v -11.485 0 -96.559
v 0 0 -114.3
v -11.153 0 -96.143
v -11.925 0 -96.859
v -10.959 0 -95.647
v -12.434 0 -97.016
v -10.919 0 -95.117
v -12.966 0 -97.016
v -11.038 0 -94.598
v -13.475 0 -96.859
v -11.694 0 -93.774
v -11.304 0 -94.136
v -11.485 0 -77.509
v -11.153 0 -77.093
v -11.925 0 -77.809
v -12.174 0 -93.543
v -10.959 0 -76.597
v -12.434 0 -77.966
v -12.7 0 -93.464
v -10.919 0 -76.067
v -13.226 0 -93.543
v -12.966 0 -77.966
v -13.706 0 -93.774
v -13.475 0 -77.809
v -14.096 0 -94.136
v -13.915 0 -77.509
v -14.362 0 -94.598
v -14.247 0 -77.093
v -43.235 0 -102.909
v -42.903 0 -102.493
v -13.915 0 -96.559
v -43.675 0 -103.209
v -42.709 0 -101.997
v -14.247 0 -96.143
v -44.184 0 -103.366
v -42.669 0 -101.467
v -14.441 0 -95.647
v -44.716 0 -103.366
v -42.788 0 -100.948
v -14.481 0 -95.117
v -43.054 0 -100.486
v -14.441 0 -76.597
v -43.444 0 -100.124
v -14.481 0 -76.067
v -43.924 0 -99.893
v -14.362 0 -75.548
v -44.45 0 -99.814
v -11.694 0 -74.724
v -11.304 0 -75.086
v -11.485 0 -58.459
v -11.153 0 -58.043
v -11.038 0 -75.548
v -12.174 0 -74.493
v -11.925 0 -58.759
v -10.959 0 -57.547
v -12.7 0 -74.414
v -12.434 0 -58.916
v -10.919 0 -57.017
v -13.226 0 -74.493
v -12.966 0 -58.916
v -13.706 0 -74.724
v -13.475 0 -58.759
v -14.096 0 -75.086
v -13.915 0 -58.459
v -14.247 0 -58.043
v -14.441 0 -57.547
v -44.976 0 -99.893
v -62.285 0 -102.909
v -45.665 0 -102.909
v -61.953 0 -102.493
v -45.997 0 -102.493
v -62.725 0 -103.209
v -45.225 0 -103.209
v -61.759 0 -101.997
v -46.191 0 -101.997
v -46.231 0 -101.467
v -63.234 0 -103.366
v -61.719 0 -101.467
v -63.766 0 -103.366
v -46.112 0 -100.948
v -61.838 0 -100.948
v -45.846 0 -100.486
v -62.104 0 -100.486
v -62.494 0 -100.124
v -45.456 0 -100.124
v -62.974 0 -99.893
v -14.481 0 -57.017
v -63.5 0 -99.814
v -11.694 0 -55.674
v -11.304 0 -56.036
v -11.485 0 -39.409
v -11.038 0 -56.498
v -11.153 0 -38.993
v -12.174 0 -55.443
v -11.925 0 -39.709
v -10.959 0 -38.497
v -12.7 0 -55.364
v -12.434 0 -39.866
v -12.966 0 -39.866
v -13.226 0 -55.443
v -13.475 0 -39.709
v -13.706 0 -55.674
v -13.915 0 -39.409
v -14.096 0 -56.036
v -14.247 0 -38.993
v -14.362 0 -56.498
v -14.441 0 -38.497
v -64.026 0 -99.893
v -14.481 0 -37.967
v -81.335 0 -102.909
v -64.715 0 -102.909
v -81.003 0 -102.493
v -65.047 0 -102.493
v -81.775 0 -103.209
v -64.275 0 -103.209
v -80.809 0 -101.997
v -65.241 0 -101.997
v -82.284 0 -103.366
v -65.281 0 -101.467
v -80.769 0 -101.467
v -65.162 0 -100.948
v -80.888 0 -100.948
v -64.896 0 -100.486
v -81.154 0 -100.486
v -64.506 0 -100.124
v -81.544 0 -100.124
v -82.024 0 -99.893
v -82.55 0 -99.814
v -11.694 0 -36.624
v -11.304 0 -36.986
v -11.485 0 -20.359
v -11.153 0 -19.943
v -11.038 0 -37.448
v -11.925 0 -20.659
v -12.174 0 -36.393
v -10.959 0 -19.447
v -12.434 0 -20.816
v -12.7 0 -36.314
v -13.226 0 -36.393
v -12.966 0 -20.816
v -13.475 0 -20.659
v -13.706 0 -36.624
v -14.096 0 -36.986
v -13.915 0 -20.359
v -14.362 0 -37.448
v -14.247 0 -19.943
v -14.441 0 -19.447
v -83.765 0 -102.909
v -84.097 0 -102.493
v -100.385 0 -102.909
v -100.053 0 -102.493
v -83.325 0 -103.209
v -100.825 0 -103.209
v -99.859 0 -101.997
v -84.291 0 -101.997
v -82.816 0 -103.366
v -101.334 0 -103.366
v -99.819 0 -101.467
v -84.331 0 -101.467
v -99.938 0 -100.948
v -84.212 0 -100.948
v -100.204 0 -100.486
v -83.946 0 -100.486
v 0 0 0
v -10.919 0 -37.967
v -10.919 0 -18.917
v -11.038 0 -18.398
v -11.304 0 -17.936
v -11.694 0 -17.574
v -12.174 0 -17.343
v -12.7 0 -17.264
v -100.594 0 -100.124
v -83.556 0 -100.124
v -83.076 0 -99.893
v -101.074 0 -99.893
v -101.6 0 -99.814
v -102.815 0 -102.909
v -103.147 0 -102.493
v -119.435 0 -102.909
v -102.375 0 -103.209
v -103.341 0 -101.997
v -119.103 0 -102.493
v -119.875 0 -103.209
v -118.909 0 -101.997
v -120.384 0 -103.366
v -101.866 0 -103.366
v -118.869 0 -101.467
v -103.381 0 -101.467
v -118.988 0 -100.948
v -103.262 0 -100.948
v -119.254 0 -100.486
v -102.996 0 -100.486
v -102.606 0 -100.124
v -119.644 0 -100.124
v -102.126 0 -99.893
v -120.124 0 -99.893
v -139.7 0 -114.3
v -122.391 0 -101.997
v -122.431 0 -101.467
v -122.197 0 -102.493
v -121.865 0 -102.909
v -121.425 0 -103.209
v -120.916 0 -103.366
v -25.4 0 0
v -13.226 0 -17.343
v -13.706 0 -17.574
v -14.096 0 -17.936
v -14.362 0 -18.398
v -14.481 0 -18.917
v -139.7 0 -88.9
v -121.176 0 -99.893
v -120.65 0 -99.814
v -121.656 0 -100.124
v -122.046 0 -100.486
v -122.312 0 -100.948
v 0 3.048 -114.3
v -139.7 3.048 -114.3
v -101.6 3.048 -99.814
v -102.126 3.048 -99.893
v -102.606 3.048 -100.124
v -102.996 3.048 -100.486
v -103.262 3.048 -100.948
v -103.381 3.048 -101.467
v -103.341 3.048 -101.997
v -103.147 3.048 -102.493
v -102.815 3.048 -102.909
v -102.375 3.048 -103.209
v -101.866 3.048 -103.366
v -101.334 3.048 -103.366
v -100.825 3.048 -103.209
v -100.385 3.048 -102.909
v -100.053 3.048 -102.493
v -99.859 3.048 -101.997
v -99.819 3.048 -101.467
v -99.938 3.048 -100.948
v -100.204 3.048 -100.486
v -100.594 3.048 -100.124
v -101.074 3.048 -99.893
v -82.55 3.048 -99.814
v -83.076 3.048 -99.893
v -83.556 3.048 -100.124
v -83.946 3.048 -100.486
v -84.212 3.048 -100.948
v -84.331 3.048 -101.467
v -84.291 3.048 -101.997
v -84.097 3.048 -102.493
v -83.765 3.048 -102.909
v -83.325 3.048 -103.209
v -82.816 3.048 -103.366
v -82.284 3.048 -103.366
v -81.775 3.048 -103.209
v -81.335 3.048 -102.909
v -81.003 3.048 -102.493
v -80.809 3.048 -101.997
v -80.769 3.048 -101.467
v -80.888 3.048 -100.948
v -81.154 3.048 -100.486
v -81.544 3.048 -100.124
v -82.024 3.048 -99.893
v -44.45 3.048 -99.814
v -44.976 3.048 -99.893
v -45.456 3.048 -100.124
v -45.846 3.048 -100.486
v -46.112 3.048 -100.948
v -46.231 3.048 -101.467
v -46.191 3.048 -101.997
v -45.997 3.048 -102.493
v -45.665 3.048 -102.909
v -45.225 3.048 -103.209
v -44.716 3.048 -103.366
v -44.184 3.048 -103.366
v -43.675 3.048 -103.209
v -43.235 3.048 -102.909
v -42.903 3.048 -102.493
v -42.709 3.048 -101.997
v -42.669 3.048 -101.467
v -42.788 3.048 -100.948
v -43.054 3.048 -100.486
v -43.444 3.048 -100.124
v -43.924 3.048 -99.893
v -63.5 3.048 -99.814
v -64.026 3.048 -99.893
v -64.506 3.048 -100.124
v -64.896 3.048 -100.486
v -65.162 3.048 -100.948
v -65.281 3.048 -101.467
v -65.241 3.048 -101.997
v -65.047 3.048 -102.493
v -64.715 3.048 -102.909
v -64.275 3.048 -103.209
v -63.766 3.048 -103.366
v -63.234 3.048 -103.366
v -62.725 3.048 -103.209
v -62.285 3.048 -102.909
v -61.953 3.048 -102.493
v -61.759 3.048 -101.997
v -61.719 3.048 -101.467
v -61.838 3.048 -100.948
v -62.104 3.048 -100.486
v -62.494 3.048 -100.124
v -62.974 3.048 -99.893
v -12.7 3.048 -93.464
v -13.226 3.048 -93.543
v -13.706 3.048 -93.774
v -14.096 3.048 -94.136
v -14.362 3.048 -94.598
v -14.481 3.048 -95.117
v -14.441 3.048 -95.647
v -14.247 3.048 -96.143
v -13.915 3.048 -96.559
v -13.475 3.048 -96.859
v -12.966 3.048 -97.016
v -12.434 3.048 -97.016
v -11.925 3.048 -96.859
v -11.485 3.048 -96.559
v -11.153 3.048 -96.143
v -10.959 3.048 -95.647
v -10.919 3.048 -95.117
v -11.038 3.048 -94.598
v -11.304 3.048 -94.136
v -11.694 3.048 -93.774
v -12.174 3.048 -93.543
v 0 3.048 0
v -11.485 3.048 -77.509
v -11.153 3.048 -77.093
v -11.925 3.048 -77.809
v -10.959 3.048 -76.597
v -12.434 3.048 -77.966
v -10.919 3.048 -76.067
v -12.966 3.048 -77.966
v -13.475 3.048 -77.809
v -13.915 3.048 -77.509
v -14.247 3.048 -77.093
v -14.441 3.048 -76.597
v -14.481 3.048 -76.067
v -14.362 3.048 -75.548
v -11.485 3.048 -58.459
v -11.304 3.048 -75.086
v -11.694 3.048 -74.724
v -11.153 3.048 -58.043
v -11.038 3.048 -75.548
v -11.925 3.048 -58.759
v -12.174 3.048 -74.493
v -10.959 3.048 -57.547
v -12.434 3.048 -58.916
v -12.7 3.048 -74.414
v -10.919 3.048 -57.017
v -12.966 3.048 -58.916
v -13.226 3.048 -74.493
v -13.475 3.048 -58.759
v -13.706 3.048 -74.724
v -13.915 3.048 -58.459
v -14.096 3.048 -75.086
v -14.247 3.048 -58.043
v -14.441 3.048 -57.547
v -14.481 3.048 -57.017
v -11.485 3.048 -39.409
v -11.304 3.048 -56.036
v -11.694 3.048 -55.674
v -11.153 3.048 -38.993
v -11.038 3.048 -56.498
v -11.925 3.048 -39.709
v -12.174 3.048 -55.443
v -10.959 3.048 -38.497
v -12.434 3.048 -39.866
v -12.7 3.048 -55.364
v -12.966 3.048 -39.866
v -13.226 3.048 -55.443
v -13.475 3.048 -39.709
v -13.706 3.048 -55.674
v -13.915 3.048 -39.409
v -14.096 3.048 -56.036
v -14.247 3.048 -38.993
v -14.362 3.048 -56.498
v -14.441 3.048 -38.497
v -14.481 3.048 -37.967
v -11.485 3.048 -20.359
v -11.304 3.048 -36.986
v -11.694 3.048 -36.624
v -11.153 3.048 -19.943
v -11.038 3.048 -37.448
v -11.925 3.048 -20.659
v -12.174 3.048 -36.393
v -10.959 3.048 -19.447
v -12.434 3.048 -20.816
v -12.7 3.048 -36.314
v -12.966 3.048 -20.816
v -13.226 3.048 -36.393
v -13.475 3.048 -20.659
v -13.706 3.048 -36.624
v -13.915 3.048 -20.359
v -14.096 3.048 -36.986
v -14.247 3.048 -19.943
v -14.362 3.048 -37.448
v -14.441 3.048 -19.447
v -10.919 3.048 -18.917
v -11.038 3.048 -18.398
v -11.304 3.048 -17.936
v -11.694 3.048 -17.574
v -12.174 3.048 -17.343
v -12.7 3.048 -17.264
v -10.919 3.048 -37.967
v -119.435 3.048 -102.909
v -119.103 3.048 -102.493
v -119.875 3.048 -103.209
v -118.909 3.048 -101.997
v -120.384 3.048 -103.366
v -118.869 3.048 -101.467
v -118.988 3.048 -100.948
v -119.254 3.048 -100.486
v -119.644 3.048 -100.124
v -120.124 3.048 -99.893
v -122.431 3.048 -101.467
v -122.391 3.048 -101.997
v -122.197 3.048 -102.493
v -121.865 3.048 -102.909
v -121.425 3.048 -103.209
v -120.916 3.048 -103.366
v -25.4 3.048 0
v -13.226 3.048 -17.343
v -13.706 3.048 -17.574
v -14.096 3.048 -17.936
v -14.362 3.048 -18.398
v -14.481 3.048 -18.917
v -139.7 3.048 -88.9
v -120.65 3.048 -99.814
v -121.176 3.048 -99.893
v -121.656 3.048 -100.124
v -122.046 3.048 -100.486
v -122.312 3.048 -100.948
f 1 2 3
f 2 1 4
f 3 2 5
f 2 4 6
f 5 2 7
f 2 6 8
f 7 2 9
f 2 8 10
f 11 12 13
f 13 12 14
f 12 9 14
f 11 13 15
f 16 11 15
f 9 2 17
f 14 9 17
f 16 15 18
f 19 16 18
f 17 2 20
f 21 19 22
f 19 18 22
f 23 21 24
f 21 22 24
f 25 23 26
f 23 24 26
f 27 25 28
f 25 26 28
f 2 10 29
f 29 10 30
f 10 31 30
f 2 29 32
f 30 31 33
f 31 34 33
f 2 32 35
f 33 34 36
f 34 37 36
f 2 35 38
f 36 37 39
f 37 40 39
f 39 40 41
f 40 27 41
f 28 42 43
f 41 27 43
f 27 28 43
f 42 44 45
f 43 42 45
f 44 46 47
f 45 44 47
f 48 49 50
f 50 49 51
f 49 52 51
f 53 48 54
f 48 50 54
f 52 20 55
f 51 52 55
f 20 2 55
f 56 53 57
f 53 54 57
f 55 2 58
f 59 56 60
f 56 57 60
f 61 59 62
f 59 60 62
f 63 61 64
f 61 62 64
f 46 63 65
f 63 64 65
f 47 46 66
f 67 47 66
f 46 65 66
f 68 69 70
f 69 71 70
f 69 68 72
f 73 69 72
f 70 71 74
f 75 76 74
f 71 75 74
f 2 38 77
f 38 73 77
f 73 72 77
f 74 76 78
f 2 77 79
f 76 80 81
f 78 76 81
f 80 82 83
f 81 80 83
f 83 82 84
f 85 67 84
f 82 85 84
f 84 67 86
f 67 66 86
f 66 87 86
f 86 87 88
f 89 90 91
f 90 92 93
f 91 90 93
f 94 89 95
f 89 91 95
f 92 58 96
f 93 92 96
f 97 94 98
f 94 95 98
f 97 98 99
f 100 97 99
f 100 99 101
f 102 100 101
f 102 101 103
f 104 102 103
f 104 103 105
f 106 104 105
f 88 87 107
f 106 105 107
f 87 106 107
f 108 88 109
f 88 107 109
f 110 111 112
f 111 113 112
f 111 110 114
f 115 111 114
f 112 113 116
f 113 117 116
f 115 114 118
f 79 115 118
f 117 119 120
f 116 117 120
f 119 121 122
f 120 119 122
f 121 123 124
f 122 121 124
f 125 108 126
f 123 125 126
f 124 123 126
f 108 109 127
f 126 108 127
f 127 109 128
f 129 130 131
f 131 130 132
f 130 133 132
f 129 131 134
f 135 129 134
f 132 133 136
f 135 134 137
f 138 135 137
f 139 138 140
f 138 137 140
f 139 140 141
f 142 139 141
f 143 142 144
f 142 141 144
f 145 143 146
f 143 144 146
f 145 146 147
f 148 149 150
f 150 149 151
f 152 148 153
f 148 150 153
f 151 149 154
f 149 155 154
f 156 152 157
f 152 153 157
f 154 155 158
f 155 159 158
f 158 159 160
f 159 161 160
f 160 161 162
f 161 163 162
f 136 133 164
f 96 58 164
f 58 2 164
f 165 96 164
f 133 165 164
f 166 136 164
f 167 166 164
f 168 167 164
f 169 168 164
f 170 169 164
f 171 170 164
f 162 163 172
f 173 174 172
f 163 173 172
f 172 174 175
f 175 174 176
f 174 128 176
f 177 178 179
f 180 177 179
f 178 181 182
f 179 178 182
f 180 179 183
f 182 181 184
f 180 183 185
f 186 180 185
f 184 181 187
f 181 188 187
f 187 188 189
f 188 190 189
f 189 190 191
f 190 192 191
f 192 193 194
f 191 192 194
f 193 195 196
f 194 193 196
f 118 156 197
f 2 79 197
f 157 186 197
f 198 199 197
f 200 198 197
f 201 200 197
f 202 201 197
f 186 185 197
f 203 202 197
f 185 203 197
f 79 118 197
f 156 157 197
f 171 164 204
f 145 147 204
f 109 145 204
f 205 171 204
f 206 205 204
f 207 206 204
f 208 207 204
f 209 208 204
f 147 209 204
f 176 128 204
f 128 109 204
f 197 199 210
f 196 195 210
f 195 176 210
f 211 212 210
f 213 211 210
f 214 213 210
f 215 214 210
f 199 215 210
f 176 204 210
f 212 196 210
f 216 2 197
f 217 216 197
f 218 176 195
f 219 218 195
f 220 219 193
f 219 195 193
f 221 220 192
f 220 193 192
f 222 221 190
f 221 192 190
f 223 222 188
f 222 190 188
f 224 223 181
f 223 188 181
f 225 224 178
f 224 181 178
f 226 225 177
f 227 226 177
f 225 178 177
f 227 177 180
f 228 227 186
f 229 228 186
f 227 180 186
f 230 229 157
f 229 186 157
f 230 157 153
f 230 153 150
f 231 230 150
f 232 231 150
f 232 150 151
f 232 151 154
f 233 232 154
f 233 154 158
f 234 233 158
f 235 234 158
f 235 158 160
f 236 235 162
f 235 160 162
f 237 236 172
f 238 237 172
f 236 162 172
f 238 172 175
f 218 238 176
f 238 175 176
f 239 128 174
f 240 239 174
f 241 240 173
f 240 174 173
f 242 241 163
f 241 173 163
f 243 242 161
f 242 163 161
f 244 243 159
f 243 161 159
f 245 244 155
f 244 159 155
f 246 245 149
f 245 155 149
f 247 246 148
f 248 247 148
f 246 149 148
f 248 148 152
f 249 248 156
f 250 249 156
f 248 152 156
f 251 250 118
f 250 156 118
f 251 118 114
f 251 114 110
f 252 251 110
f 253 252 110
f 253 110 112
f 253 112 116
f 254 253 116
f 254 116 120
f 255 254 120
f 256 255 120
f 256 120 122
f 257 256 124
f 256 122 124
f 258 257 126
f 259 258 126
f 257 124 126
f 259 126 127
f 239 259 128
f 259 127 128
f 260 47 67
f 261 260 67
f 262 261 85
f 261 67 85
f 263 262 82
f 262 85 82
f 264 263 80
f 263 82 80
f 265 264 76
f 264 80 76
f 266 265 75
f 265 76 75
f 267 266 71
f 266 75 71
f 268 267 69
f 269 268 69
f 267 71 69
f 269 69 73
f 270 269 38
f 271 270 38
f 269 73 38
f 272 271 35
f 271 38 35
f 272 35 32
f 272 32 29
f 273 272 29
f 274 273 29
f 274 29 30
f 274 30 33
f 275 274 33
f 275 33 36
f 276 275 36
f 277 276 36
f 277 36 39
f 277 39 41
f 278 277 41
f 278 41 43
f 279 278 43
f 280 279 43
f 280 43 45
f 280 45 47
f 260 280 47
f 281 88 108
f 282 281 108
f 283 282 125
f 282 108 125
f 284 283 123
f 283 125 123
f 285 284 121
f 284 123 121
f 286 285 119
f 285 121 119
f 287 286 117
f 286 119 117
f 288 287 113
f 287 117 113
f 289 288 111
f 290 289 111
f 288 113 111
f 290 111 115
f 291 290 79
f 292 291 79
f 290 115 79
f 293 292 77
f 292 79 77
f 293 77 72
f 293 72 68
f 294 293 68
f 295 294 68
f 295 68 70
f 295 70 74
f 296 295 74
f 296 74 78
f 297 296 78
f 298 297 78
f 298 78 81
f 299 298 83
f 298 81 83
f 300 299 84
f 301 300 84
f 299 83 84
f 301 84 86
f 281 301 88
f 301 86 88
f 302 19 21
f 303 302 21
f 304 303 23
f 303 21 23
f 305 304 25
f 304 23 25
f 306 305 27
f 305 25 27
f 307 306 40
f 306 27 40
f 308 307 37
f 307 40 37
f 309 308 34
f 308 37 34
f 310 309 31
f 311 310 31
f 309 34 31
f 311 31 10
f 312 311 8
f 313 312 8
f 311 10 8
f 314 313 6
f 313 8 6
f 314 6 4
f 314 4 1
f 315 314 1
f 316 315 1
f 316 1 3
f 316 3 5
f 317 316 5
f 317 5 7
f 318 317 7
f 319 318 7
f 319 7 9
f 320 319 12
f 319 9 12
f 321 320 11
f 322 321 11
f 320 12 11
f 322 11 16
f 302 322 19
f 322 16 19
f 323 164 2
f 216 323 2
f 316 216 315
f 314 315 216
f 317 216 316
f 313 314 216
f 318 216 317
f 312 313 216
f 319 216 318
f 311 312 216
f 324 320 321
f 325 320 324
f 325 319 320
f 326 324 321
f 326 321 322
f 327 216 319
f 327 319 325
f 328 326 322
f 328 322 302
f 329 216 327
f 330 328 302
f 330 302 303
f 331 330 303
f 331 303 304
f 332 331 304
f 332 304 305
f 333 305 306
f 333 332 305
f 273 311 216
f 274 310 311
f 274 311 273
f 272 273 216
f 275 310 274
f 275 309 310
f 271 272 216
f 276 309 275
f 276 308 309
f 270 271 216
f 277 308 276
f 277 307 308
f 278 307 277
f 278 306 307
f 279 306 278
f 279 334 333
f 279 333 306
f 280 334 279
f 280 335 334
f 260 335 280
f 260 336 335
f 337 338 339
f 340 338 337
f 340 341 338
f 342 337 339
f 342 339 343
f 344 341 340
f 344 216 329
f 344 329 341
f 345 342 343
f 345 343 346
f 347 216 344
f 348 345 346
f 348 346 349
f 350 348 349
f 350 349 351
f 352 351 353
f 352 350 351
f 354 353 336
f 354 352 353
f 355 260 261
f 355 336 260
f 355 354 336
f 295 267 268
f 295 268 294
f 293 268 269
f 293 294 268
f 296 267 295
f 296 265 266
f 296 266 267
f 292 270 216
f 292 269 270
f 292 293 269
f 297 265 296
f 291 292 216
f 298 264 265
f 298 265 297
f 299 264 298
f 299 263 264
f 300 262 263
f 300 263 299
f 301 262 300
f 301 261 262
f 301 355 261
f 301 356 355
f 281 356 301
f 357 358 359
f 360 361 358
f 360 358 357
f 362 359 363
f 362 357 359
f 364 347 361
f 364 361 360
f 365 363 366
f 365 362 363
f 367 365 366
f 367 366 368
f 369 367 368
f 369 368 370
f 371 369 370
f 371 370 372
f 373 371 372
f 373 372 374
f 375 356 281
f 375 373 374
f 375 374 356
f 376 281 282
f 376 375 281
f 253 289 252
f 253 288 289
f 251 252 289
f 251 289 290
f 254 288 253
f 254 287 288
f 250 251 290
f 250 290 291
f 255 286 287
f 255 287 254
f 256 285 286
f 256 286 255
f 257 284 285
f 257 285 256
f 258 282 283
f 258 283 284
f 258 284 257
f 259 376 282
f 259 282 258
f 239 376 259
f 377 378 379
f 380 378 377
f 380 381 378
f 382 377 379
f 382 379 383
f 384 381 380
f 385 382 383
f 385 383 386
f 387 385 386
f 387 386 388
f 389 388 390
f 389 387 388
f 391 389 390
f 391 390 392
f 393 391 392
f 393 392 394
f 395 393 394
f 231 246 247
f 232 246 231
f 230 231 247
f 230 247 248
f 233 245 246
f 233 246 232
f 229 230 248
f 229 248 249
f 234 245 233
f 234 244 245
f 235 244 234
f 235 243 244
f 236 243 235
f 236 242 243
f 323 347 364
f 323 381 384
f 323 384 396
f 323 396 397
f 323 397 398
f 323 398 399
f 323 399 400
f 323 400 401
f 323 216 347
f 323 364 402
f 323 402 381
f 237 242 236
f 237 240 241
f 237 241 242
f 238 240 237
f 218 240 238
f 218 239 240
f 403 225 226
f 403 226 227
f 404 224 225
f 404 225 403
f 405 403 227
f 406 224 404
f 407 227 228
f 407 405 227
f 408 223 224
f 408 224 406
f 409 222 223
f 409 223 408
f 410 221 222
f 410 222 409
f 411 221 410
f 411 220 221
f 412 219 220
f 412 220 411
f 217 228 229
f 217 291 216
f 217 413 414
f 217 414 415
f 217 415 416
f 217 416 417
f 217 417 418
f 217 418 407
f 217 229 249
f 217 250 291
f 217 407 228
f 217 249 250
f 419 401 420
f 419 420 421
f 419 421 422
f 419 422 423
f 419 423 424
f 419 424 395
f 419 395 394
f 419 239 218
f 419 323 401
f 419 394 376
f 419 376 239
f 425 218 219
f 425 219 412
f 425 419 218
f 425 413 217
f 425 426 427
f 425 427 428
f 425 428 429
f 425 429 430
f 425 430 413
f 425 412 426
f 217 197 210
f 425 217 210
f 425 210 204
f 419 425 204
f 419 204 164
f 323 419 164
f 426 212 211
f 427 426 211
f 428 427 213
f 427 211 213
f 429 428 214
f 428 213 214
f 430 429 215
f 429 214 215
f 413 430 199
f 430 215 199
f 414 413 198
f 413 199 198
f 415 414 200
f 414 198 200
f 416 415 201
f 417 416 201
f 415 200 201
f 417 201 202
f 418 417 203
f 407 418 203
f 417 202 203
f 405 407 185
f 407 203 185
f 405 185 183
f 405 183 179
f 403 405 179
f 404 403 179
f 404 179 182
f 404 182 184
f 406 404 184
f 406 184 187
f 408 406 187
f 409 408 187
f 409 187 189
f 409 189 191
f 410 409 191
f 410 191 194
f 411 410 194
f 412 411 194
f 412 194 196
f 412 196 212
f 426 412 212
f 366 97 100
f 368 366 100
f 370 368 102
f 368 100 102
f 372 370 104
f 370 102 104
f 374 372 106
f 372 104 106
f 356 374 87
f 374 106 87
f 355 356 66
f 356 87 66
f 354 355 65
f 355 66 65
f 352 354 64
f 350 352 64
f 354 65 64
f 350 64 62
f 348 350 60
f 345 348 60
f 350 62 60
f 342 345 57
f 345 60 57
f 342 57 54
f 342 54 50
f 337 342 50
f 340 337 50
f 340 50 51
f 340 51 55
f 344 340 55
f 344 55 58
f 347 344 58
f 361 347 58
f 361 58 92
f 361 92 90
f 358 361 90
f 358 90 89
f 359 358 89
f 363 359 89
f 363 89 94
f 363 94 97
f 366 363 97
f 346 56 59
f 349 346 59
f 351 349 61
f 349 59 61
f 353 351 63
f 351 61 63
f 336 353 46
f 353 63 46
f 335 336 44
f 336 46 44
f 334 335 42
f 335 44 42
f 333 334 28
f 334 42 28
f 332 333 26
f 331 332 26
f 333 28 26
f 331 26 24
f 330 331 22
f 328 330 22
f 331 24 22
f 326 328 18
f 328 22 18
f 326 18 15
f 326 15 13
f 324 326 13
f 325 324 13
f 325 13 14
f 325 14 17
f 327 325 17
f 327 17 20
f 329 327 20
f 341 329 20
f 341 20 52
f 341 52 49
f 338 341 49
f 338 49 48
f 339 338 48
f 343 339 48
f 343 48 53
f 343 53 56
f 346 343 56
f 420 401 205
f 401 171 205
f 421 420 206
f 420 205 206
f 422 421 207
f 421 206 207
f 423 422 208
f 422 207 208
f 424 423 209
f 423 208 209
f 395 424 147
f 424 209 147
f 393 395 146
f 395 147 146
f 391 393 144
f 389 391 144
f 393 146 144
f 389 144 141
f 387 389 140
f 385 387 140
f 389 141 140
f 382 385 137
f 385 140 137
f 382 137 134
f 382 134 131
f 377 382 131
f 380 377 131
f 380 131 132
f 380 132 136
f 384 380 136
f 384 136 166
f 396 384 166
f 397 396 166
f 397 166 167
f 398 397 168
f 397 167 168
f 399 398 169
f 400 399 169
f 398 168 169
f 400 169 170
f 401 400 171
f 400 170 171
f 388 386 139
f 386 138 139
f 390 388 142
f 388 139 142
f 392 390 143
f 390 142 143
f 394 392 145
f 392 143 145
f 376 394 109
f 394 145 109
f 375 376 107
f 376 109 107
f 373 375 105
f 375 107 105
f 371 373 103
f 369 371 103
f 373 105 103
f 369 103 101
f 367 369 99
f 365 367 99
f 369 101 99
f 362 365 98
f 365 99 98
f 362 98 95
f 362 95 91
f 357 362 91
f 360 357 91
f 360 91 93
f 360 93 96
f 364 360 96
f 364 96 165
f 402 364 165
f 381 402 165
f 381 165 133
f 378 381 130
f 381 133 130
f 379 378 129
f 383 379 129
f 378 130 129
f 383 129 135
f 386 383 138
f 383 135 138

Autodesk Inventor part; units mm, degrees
ref_plane "YZ Plane" through (0, 0, 0) normal (1, 0, 0) x (0, 1, 0)
ref_plane "XZ Plane" through (0, 0, 0) normal (0, 1, 0) x (-1, 0, 0)
ref_plane "XY Plane" through (0, 0, 0) normal (0, 0, 1) x (1, 0, 0)
sketch "face_sketch" plane through (0, 0, 0) normal (0, 1, 0) x (-1, 0, 0)
  line L0 (0, 0) -> (0, -114.3)
  line L1 (139.7, -114.3) -> (139.7, -88.9)
  line L2 (139.7, -88.9) -> (25.4, 0)
  line L3 (25.4, 0) -> (0, 0)
  line L4 (25.4, 0) -> (25.4, -114.3) construction
  line L5 (0, -114.3) -> (25.4, -114.3)
  line L6 (25.4, -114.3) -> (139.7, -114.3)
  dimension "d0" = 114.3
  dimension "d2" = 25.4
  dimension "d3" = 25.4
  dimension "d5" = 114.3
extrude "Plate1" add sketch "face_sketch" along normal blind 3.048
sketch "Sketch4" plane through (0, 3.048, 0) normal (0, 1, 0) x (1, 0, 0)
  line L0 (-25.4, 0) -> (0, 0) construction
  line L1 (-12.7, 0) -> (-12.7, 19.05) construction
  line L2 (-12.7, 19.05) -> (-12.7, 38.1) construction
  line L3 (-12.7, 38.1) -> (-12.7, 57.15) construction
  line L4 (-12.7, 57.15) -> (-12.7, 76.2) construction
  line L5 (-12.7, 76.2) -> (-12.7, 95.25) construction
  line L6 (-12.7, 95.25) -> (-12.7, 114.3) construction
  line L7 (0, 114.3) -> (-139.7, 114.3) construction
  line L8 (-139.7, 114.3) -> (-139.7, 88.9) construction
  line L9 (-139.7, 101.6) -> (-120.65, 101.6) construction
  line L10 (-120.65, 101.6) -> (-101.6, 101.6) construction
  line L11 (-101.6, 101.6) -> (-82.55, 101.6) construction
  line L12 (-82.55, 101.6) -> (-63.5, 101.6) construction
  line L13 (-63.5, 101.6) -> (-44.45, 101.6) construction
  line L14 (-44.45, 101.6) -> (-25.4, 101.6) construction
  line L15 (-25.4, 0) -> (-25.4, 101.6) construction
hole "Hole1" at (-12.7, 3.048, -19.05) at (-12.7, 3.048, -38.1) at (-12.7, 3.048, -57.15) at (-12.7, 3.048, -76.2) at (-12.7, 3.048, -95.25) at (-120.65, 3.048, -101.6) at (-101.6, 3.048, -101.6) at (-82.55, 3.048, -101.6) at (-63.5, 3.048, -101.6) at (-44.45, 3.048, -101.6) direction (0, -1, 0) diameter 3.5719 depth 3.048 tip angle 118
equation "\"d6\" = rv_hole_diameter"
equation "\"d11\" = Thickness"
equation "\"d0\" = ncbt_rivet_row_length"
equation "\"d2\" = st_outer_diameter"
equation "\"d3\" = st_outer_diameter"
equation "\"d5\" = ncbt_rivet_row_length"
equation "\"BendRadius\" = Thickness"
equation "\"BendReliefWidth\" = Thickness"
equation "\"BendReliefDepth\" = 0.5 * Thickness"
equation "\"CornerReliefSize\" = 4 * Thickness"
equation "\"MinimumRemnant\" = 2 * Thickness"
equation "\"TransitionRadius\" = BendRadius"
equation "\"JacobiRadiusSize\" = BendRadius"
equation "\"GapSize\" = Thickness"
equation "\"bp_thickness\" = 3.048"
equation "\"bp_height\" = 25.4"
equation "\"bp_width\" = 25.4"
equation "\"bp_axle_height\" = 25.4"
equation "\"magic_axle_offset\" = 3.175"
equation "\"bp_tensioner_width\" = 6.35"
equation "\"bp_tensioner_height\" = 19.05"
equation "\"bp_tensioner_from_bottom\" = 50.8"
equation "\"bp_tensioner_from_side\" = 25.4"
equation "\"bp_tensioner_wood_mount_from_tensioner_top\" = 12.7"
equation "\"bp_tensioner_wood_mount_diameter\" = 6.35"
equation "\"gb_mh_seperation\" = 111.1504"
equation "\"gb_mh_diameter\" = 6.35"
equation "\"gb_axle_from_edge\" = 38.1"
equation "\"gb_width\" = 127"
equation "\"gb_bearing_diameter\" = 28.575"
equation "\"gb_to_bottom_of_side_assembly\" = 4.7752"
equation "\"rivet_row_length\" = 114.3"
equation "\"rv_hole_diameter\" = 3.57187"
equation "\"st_outer_diameter\" = 25.4"
equation "\"st_wall_thickness\" = 6.35"
equation "\"st_length\" = 939.8"
equation "\"st_gbmh_from_center\" = 0.5 * gb_mh_seperation"
equation "\"st_cutout_depth_right\" = 254"
equation "\"st_cutout_depth_left\" = 254"
equation "\"st_rivet_distance\" = 19.05"
equation "\"so_inner_diameter\" = 6.35"
equation "\"so_wall_thickness\" = 3.048"
equation "\"so_length\" = 25.4"
equation "\"twb_width\" = st_outer_diameter"
equation "\"twb_length\" = bp_tensioner_width + 2 * twb_margin_on_each_side"
equation "\"twb_height\" = 2 * bp_tensioner_wood_mount_diameter + bp_tensioner_height + 2 * bp_tensioner_wood_mount_from_tensioner_top + twb_margin_on_each_side"
equation "\"twb_margin_on_each_side\" = 6.35"
equation "\"twb_tensioner_from_edge\" = -0.5 * bp_tensioner_height + 0.5 * twb_height"
equation "\"tb_rivet_row_length\" = 127"
equation "\"ncbt_rivet_row_length\" = 114.3"
equation "\"d4\" = BendRadius"
equation "\"Thickness\" = 3.048"
properties part number "no_cutout_bracket_top(ncbt)"
